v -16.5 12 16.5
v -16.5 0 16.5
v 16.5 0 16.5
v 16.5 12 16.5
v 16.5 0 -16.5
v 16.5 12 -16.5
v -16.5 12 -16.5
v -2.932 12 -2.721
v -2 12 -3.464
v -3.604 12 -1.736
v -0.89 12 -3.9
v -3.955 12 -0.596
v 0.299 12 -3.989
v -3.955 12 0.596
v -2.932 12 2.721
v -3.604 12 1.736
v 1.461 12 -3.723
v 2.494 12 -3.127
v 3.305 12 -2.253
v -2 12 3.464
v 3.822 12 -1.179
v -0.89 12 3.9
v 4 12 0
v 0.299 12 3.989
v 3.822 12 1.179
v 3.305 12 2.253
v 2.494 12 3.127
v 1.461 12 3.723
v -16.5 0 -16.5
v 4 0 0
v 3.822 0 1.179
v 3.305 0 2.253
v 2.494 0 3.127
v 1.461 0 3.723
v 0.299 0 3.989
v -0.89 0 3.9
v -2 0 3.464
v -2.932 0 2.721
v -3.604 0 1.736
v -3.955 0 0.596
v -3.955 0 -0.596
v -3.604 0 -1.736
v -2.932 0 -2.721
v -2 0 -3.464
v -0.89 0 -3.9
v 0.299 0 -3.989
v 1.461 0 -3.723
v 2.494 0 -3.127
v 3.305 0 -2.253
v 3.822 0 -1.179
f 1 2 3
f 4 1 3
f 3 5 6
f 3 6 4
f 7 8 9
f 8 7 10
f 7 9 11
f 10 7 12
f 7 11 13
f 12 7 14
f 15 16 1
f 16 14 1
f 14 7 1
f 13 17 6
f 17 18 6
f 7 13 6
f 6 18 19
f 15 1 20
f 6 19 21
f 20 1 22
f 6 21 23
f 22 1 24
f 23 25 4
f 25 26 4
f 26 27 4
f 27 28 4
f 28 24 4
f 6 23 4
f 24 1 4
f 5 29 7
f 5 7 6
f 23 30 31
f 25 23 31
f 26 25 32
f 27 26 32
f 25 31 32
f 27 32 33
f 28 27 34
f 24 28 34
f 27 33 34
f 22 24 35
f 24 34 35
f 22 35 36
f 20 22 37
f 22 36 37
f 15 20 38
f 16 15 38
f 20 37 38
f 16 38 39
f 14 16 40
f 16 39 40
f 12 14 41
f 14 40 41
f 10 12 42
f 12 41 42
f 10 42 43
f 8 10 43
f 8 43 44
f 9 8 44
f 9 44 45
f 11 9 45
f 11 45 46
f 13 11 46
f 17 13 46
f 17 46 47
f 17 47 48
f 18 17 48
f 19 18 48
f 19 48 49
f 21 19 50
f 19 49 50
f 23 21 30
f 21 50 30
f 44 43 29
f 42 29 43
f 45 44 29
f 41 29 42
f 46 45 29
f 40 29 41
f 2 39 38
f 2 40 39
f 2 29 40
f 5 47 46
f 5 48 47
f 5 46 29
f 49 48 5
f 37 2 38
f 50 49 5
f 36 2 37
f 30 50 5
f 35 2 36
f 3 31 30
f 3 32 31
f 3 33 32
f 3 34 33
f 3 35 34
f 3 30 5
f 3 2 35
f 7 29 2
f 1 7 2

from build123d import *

# Parameters (mm, degrees)
F0_W     = 33
F0_H     = 33
F1_DEPTH = 12
F2_R     = 4
F3_DEPTH = 12


with BuildPart() as f1:
    # F0 (on Front) → F1 (new body)
    with BuildSketch(Plane.XZ):
        Rectangle(F0_W, F0_H)
    extrude(amount=-F1_DEPTH)

    # F2 (on face) → F3 (cut)
    with BuildSketch(Plane.XZ):
        Circle(F2_R)
    extrude(amount=-F3_DEPTH, mode=Mode.SUBTRACT)


solid = f1.part
